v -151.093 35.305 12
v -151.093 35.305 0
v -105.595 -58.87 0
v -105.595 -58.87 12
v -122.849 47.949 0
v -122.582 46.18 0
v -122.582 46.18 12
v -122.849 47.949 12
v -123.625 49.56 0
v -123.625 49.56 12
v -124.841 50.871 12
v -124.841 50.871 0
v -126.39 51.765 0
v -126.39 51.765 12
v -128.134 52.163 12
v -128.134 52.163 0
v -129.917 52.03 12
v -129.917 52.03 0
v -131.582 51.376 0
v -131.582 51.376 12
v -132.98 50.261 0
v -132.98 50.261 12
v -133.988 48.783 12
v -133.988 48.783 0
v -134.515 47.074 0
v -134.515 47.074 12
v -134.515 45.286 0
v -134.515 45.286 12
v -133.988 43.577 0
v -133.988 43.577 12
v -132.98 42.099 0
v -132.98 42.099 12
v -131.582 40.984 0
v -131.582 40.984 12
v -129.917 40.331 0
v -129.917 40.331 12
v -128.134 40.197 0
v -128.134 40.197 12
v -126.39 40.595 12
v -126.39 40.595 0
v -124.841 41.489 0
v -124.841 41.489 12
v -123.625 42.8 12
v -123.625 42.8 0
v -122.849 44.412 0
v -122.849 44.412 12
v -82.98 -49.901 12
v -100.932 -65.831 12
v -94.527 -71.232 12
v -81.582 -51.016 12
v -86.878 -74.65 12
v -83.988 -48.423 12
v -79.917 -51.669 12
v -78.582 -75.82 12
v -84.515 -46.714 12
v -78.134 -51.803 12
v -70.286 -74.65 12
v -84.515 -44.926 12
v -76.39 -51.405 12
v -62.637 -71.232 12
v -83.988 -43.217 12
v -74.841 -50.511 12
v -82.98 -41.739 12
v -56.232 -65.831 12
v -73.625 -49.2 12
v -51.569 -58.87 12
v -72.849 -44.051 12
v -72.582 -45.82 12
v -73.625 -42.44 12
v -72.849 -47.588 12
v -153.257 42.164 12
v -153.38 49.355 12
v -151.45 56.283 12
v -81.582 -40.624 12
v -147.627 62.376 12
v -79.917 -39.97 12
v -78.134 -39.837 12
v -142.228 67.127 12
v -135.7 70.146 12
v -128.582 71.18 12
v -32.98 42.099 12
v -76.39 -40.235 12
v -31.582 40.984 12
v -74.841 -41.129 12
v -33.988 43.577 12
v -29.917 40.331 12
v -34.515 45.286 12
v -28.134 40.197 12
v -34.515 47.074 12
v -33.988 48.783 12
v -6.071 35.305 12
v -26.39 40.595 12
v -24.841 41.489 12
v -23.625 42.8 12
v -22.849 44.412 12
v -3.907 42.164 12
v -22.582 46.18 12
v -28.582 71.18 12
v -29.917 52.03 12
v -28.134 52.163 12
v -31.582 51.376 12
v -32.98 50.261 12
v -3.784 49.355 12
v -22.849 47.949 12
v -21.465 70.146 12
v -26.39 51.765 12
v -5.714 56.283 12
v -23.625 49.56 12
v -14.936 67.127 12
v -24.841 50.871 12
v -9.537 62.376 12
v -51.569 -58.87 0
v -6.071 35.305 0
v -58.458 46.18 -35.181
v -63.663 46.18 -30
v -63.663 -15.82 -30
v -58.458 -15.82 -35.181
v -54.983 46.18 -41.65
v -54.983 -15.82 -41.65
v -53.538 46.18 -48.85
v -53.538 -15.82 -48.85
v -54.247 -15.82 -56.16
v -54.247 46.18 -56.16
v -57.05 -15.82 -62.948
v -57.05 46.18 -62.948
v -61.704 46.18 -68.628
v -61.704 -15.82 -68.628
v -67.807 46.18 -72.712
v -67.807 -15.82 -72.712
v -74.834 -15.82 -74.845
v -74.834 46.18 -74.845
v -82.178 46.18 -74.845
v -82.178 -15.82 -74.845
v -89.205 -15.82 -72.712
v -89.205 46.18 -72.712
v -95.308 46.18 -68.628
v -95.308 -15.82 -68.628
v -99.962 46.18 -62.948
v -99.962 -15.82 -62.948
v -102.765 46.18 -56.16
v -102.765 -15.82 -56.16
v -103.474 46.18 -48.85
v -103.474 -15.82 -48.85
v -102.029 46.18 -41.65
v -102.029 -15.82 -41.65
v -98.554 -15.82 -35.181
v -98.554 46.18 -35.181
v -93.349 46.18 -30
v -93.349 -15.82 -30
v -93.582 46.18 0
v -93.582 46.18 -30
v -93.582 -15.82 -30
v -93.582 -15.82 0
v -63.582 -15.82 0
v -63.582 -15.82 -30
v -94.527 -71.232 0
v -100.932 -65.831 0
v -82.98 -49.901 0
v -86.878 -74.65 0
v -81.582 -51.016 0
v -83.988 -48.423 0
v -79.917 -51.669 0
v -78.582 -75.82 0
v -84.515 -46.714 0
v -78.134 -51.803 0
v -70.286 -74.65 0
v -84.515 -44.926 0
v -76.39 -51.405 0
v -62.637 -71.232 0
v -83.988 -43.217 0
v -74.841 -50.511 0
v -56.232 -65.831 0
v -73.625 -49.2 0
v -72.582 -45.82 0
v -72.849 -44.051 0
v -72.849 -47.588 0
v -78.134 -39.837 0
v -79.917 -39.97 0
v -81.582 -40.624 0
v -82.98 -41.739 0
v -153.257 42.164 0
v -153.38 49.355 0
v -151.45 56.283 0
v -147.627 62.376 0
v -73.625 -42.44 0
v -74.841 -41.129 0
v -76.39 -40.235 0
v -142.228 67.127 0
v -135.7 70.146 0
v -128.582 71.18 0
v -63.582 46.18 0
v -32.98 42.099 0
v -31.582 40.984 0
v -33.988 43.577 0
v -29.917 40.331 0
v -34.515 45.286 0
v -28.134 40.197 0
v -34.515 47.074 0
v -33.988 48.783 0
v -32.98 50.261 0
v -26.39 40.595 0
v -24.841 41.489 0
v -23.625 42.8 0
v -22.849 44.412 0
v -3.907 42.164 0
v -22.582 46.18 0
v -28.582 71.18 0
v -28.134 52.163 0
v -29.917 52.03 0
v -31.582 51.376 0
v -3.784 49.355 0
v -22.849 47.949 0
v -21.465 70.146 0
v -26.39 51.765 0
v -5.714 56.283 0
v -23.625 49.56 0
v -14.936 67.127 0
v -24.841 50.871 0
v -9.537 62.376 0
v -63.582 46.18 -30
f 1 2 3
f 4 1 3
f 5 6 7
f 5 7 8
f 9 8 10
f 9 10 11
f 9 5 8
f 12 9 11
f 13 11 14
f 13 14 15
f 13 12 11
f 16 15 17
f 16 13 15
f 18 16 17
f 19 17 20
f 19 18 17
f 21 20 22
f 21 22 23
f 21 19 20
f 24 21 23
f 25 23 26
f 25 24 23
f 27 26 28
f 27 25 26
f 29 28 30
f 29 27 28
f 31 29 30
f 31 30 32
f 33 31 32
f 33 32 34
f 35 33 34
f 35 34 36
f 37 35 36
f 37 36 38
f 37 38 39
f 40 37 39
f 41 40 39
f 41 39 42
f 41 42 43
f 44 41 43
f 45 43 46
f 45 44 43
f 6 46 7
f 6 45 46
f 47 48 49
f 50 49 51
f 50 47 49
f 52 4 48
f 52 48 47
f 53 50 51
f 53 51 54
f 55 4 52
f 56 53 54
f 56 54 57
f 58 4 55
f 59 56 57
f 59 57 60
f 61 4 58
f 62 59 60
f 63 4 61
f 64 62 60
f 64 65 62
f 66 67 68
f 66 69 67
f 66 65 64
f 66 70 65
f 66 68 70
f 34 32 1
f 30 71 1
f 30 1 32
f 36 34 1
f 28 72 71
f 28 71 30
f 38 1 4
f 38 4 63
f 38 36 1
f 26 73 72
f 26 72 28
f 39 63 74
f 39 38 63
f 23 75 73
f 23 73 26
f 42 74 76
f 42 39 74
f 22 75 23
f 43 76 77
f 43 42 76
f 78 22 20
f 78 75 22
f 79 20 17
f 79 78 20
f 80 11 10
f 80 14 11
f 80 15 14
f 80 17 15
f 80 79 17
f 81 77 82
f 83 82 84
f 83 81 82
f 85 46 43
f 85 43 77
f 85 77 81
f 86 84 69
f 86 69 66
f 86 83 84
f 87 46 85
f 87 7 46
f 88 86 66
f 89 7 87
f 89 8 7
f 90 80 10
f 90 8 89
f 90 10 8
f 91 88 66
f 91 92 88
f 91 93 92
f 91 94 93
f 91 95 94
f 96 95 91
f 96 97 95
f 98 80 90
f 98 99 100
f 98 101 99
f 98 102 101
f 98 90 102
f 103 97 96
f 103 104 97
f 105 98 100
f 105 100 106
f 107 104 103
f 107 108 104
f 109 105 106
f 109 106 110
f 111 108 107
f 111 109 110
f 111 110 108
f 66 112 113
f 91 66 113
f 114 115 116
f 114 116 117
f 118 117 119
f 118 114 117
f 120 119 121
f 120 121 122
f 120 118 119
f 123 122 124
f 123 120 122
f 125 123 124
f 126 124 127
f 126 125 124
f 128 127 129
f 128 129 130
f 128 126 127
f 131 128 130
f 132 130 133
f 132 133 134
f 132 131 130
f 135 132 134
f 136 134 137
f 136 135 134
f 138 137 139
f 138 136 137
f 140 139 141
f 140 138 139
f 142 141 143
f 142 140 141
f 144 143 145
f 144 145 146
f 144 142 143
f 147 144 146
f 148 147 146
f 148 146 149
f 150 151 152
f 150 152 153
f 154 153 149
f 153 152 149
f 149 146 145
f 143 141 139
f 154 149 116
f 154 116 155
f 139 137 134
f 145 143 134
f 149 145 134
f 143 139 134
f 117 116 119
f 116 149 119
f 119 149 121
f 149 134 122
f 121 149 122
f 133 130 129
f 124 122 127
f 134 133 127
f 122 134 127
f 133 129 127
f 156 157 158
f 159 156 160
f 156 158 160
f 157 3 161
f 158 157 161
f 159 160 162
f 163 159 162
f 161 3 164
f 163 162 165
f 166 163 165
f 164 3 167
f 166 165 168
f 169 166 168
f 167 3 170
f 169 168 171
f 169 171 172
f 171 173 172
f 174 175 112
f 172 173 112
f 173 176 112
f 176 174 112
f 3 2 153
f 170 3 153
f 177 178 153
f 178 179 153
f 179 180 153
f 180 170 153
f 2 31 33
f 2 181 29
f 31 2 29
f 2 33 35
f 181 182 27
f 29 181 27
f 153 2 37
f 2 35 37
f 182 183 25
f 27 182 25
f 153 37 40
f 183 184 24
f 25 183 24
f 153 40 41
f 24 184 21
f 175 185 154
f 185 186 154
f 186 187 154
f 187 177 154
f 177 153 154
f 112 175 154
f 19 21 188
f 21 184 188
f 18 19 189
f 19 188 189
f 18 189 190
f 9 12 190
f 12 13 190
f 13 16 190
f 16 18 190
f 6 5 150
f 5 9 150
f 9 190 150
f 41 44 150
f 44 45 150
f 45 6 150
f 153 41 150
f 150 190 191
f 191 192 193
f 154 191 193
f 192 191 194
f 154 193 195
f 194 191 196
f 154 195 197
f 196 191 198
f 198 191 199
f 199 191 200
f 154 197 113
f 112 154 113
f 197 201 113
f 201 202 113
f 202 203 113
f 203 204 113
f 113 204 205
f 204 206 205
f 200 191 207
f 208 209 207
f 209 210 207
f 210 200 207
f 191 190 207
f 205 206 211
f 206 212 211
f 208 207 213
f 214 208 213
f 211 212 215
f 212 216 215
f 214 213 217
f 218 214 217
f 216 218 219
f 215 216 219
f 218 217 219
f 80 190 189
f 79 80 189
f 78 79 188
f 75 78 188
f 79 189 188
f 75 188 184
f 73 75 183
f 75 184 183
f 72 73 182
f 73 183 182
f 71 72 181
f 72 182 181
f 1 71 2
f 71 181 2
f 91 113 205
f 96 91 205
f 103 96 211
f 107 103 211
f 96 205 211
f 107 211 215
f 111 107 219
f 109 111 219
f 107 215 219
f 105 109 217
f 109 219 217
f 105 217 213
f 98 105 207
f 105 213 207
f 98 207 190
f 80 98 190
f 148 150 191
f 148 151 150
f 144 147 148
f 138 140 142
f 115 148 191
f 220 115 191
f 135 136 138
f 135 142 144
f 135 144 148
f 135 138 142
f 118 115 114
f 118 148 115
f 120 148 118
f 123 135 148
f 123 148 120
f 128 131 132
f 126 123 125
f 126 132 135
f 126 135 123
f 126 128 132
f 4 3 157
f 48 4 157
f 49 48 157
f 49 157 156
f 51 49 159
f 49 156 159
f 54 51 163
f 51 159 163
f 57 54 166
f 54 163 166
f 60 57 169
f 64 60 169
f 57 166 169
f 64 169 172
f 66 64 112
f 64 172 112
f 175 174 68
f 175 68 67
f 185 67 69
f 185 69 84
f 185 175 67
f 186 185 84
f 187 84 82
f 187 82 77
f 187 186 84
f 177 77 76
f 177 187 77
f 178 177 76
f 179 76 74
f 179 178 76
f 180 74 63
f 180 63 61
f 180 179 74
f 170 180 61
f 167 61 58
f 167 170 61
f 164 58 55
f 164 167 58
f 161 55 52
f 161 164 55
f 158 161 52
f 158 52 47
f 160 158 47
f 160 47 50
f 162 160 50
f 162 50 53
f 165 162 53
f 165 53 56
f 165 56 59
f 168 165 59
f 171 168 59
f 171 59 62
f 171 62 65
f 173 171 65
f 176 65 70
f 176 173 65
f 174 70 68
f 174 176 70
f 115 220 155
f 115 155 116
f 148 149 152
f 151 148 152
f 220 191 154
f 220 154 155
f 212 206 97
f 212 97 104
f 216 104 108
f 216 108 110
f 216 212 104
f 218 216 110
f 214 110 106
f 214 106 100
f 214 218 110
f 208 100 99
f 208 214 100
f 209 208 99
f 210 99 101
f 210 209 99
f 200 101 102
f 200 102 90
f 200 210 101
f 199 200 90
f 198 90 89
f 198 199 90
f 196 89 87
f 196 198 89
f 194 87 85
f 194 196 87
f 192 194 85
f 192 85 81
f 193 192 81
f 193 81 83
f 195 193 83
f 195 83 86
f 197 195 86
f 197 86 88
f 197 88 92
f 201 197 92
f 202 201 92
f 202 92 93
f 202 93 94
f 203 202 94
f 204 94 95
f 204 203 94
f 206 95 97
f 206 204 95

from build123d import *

# Parameters (mm, degrees)
Y_KSEKLIK_EKSTR_ZYON1_OUTLINE_R = 6
Y_KSEKLIK_EKSTR_ZYON1_DEPTH     = 12
Y_KSEKLIK_EKSTR_ZYON6_DEPTH     = 62


# Read off the part's stored shape, not the designer's step: Yükseklik-Ekstrüzyon1
with BuildPart() as part:
    # Yükseklik-Ekstrüzyon1 outline → Yükseklik-Ekstrüzyon1 (new body)
    with BuildSketch(Plane.XY):
        with BuildLine():
            ThreePointArc((-6.071419214, 35.304785694), (-7.405582554, 59.467641529), (-28.582022208, 71.180113408))
            Line((-28.582022208, 71.180113408), (-128.582022208, 71.180113408))
            ThreePointArc((-128.582022208, 71.180113408), (-149.758461862, 59.467641529), (-151.092625201, 35.304785694))
            Line((-151.092625201, 35.304785694), (-105.594745799, -58.870279849))
            ThreePointArc((-105.594745799, -58.870279849), (-78.582022207, -75.819886592), (-51.569298616, -58.870279849))
            Line((-51.569298616, -58.870279849), (-6.071419214, 35.304785694))
        make_face()
        with Locations((-78.582022208, -45.819886592)):
            Circle(Y_KSEKLIK_EKSTR_ZYON1_OUTLINE_R, mode=Mode.SUBTRACT)
        with Locations((-128.582022208, 46.180113408)):
            Circle(Y_KSEKLIK_EKSTR_ZYON1_OUTLINE_R, mode=Mode.SUBTRACT)
        with Locations((-28.582022208, 46.180113408)):
            Circle(Y_KSEKLIK_EKSTR_ZYON1_OUTLINE_R, mode=Mode.SUBTRACT)
    extrude(amount=Y_KSEKLIK_EKSTR_ZYON1_DEPTH)

    # Çizim6 → Yükseklik-Ekstrüzyon6 (add)
    with BuildSketch(Plane(origin=(0, 46.180113408, 0), x_dir=(1, 0, 0), z_dir=(0, 1, 0))):
        with BuildLine():
            Line((-93.582022208, 0), (-63.582022208, 0))
            Line((-63.582022208, 0), (-63.582022208, 30))
            Line((-63.582022208, 30), (-63.662550873, 30))
            ThreePointArc((-63.662550873, 30), (-78.505910332, 75.116527532), (-93.349269791, 30))
            Line((-93.349269791, 30), (-93.582022208, 30))
            Line((-93.582022208, 30), (-93.582022208, 0))
        make_face()
    extrude(amount=-Y_KSEKLIK_EKSTR_ZYON6_DEPTH)


solid = part.part
